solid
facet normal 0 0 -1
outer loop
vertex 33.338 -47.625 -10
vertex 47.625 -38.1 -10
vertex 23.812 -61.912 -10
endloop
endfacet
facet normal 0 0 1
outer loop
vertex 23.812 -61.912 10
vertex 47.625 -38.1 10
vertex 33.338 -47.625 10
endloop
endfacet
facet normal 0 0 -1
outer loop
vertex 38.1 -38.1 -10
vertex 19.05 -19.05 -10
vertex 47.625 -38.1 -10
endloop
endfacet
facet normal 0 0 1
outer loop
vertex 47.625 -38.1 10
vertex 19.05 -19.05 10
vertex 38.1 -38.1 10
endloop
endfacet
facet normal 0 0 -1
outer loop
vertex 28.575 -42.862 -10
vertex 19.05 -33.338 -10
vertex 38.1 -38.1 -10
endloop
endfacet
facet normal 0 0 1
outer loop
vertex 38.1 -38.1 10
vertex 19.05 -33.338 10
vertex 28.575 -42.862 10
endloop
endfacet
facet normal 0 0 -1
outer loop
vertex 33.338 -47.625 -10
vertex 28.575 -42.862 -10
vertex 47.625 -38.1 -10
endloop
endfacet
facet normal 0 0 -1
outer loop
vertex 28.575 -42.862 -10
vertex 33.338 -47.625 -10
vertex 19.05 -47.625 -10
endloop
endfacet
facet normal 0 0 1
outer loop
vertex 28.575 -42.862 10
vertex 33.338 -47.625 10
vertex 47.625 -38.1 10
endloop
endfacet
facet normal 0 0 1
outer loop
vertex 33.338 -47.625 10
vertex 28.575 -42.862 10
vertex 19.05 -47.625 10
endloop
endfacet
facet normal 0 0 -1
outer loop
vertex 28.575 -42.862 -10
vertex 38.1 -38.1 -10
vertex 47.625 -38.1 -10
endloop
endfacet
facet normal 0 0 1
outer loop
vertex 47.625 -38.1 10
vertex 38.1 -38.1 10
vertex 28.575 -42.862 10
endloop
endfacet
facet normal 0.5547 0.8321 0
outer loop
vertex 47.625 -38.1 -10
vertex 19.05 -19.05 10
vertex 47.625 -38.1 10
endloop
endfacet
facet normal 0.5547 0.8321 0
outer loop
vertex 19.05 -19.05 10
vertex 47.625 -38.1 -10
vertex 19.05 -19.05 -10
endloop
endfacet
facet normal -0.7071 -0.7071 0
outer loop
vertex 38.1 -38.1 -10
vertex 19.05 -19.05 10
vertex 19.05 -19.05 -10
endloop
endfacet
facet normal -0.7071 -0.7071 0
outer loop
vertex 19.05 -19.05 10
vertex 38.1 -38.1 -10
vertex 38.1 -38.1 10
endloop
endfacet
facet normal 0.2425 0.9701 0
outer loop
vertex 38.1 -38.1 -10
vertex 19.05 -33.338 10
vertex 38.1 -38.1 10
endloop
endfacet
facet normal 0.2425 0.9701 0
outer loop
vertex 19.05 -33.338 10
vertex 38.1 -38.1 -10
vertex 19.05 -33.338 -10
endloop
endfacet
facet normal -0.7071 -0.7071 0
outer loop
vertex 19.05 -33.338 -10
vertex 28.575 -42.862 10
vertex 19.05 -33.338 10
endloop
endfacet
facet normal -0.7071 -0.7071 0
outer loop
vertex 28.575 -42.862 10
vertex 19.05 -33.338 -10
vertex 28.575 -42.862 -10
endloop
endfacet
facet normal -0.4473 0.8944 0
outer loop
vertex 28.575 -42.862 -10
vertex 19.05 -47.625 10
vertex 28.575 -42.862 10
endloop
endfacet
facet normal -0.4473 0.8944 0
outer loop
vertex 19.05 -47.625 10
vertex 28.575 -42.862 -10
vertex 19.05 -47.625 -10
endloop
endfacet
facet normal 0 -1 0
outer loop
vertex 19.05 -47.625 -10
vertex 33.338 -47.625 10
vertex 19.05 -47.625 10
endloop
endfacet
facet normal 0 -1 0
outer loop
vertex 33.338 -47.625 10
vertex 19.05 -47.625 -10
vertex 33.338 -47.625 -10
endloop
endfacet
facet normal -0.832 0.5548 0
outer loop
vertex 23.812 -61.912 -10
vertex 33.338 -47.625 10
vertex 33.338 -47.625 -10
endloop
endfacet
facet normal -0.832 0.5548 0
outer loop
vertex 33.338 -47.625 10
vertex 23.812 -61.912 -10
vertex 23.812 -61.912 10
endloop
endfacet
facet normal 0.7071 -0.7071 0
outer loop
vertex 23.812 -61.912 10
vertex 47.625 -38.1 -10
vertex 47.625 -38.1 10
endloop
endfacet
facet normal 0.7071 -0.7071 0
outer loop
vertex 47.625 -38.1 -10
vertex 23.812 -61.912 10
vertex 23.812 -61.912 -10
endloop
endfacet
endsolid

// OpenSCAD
polyhedron(
    points=[
    [47.625, -38.1, -10],
    [19.05, -19.05, -10],
    [38.1, -38.1, -10],
    [19.05, -33.3375, -10],
    [28.575, -42.8625, -10],
    [19.05, -47.625, -10],
    [33.3375, -47.625, -10],
    [23.8125, -61.9125, -10],
    [47.625, -38.1, 10],
    [19.05, -19.05, 10],
    [38.1, -38.1, 10],
    [19.05, -33.3375, 10],
    [28.575, -42.8625, 10],
    [19.05, -47.625, 10],
    [33.3375, -47.625, 10],
    [23.8125, -61.9125, 10],
    ],
    faces=[
        [7,0,6],
        [14,8,15],
        [0,1,2],
        [10,9,8],
        [2,3,4],
        [12,11,10],
        [6,0,4,5],
        [13,12,8,14],
        [0,2,4],
        [12,10,8],
        [0,8,9,1],
        [1,9,10,2],
        [2,10,11,3],
        [3,11,12,4],
        [4,12,13,5],
        [5,13,14,6],
        [6,14,15,7],
        [7,15,8,0],
    ]
);
